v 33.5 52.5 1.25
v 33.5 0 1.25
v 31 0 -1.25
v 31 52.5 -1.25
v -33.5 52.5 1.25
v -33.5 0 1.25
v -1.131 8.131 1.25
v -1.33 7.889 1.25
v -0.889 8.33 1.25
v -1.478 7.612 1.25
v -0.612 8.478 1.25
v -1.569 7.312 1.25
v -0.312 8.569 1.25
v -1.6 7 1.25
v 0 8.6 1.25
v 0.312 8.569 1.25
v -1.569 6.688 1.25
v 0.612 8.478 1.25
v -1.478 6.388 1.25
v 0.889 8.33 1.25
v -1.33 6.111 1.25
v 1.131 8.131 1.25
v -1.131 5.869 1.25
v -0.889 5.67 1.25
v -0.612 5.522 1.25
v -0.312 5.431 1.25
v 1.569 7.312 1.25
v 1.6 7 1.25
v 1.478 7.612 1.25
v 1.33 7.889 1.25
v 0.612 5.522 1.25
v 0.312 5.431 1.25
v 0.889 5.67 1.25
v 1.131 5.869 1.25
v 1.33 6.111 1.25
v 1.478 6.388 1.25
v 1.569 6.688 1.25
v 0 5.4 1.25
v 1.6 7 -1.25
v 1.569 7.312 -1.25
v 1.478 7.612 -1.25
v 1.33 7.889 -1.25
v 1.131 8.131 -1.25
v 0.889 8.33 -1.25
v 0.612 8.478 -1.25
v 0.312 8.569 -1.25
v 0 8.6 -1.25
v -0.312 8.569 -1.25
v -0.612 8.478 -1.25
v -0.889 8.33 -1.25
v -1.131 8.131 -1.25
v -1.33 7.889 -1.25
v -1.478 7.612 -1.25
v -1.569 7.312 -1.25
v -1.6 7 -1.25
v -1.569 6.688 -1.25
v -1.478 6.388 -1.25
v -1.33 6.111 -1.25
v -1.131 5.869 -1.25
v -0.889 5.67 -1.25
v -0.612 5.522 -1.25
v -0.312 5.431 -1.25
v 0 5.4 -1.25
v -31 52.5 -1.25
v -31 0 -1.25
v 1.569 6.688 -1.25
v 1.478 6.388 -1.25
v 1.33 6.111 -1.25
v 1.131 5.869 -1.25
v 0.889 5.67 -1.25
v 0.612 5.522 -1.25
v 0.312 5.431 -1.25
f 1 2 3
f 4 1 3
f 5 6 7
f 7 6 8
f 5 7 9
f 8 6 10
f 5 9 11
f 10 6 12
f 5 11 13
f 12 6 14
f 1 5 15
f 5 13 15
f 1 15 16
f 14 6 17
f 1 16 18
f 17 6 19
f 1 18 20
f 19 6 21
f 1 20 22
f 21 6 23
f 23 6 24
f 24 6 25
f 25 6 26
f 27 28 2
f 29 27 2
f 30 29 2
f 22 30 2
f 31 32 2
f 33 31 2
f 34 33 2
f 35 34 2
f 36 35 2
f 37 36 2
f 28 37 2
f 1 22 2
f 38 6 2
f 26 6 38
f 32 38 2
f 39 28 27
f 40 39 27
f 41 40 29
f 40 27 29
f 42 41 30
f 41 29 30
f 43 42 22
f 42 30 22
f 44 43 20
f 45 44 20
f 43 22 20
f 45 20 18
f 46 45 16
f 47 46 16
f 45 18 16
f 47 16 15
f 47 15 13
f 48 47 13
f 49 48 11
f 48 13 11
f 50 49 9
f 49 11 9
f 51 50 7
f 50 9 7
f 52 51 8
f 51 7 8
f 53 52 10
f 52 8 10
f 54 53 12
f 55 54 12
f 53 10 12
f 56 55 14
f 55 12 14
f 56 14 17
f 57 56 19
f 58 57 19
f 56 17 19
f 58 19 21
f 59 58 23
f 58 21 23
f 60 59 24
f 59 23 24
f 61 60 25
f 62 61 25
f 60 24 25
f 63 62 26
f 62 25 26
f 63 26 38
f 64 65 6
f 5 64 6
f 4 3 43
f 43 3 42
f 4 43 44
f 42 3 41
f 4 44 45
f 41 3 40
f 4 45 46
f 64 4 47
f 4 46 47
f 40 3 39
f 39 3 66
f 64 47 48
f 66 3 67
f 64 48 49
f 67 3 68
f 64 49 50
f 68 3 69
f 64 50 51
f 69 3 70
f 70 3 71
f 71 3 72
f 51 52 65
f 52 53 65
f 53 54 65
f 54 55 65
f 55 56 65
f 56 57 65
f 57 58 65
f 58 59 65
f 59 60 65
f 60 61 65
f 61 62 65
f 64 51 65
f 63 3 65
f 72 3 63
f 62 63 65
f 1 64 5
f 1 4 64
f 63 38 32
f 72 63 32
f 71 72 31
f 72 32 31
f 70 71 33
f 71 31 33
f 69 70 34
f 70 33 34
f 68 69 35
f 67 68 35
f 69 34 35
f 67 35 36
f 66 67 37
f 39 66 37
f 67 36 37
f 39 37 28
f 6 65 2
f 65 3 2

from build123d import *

# Parameters (mm, degrees)
BOSS_EXTRUDE1_DEPTH = 52.5
CUT_EXTRUDE1_DEPTH  = 63.327762674


with BuildPart() as part:
    # Sketch2 → Boss-Extrude1 (new body)
    with BuildSketch(Plane(origin=(0, 0, 0), x_dir=(1, 0, 0), z_dir=(0, 1, 0))):
        Polygon((-31, 1.25), (-33.5, -1.25), (33.5, -1.25), (31, 1.25), align=None)
    extrude(amount=BOSS_EXTRUDE1_DEPTH)

    # Sketch3 → Cut-Extrude1 (cut, through all)
    with BuildSketch(Plane.XY.offset(1.25)):
        with BuildLine():
            ThreePointArc((0, 8.6), (-1.6, 7), (0, 5.4))
            Line((0, 5.4), (0, 8.6))
        make_face()
        with BuildLine():
            Line((0, 8.6), (0, 5.4))
            ThreePointArc((0, 5.4), (1.13137085, 5.86862915), (1.6, 7))
            ThreePointArc((1.6, 7), (1.13137085, 8.13137085), (0, 8.6))
        make_face()
    extrude(amount=-CUT_EXTRUDE1_DEPTH, mode=Mode.SUBTRACT)


solid = part.part
